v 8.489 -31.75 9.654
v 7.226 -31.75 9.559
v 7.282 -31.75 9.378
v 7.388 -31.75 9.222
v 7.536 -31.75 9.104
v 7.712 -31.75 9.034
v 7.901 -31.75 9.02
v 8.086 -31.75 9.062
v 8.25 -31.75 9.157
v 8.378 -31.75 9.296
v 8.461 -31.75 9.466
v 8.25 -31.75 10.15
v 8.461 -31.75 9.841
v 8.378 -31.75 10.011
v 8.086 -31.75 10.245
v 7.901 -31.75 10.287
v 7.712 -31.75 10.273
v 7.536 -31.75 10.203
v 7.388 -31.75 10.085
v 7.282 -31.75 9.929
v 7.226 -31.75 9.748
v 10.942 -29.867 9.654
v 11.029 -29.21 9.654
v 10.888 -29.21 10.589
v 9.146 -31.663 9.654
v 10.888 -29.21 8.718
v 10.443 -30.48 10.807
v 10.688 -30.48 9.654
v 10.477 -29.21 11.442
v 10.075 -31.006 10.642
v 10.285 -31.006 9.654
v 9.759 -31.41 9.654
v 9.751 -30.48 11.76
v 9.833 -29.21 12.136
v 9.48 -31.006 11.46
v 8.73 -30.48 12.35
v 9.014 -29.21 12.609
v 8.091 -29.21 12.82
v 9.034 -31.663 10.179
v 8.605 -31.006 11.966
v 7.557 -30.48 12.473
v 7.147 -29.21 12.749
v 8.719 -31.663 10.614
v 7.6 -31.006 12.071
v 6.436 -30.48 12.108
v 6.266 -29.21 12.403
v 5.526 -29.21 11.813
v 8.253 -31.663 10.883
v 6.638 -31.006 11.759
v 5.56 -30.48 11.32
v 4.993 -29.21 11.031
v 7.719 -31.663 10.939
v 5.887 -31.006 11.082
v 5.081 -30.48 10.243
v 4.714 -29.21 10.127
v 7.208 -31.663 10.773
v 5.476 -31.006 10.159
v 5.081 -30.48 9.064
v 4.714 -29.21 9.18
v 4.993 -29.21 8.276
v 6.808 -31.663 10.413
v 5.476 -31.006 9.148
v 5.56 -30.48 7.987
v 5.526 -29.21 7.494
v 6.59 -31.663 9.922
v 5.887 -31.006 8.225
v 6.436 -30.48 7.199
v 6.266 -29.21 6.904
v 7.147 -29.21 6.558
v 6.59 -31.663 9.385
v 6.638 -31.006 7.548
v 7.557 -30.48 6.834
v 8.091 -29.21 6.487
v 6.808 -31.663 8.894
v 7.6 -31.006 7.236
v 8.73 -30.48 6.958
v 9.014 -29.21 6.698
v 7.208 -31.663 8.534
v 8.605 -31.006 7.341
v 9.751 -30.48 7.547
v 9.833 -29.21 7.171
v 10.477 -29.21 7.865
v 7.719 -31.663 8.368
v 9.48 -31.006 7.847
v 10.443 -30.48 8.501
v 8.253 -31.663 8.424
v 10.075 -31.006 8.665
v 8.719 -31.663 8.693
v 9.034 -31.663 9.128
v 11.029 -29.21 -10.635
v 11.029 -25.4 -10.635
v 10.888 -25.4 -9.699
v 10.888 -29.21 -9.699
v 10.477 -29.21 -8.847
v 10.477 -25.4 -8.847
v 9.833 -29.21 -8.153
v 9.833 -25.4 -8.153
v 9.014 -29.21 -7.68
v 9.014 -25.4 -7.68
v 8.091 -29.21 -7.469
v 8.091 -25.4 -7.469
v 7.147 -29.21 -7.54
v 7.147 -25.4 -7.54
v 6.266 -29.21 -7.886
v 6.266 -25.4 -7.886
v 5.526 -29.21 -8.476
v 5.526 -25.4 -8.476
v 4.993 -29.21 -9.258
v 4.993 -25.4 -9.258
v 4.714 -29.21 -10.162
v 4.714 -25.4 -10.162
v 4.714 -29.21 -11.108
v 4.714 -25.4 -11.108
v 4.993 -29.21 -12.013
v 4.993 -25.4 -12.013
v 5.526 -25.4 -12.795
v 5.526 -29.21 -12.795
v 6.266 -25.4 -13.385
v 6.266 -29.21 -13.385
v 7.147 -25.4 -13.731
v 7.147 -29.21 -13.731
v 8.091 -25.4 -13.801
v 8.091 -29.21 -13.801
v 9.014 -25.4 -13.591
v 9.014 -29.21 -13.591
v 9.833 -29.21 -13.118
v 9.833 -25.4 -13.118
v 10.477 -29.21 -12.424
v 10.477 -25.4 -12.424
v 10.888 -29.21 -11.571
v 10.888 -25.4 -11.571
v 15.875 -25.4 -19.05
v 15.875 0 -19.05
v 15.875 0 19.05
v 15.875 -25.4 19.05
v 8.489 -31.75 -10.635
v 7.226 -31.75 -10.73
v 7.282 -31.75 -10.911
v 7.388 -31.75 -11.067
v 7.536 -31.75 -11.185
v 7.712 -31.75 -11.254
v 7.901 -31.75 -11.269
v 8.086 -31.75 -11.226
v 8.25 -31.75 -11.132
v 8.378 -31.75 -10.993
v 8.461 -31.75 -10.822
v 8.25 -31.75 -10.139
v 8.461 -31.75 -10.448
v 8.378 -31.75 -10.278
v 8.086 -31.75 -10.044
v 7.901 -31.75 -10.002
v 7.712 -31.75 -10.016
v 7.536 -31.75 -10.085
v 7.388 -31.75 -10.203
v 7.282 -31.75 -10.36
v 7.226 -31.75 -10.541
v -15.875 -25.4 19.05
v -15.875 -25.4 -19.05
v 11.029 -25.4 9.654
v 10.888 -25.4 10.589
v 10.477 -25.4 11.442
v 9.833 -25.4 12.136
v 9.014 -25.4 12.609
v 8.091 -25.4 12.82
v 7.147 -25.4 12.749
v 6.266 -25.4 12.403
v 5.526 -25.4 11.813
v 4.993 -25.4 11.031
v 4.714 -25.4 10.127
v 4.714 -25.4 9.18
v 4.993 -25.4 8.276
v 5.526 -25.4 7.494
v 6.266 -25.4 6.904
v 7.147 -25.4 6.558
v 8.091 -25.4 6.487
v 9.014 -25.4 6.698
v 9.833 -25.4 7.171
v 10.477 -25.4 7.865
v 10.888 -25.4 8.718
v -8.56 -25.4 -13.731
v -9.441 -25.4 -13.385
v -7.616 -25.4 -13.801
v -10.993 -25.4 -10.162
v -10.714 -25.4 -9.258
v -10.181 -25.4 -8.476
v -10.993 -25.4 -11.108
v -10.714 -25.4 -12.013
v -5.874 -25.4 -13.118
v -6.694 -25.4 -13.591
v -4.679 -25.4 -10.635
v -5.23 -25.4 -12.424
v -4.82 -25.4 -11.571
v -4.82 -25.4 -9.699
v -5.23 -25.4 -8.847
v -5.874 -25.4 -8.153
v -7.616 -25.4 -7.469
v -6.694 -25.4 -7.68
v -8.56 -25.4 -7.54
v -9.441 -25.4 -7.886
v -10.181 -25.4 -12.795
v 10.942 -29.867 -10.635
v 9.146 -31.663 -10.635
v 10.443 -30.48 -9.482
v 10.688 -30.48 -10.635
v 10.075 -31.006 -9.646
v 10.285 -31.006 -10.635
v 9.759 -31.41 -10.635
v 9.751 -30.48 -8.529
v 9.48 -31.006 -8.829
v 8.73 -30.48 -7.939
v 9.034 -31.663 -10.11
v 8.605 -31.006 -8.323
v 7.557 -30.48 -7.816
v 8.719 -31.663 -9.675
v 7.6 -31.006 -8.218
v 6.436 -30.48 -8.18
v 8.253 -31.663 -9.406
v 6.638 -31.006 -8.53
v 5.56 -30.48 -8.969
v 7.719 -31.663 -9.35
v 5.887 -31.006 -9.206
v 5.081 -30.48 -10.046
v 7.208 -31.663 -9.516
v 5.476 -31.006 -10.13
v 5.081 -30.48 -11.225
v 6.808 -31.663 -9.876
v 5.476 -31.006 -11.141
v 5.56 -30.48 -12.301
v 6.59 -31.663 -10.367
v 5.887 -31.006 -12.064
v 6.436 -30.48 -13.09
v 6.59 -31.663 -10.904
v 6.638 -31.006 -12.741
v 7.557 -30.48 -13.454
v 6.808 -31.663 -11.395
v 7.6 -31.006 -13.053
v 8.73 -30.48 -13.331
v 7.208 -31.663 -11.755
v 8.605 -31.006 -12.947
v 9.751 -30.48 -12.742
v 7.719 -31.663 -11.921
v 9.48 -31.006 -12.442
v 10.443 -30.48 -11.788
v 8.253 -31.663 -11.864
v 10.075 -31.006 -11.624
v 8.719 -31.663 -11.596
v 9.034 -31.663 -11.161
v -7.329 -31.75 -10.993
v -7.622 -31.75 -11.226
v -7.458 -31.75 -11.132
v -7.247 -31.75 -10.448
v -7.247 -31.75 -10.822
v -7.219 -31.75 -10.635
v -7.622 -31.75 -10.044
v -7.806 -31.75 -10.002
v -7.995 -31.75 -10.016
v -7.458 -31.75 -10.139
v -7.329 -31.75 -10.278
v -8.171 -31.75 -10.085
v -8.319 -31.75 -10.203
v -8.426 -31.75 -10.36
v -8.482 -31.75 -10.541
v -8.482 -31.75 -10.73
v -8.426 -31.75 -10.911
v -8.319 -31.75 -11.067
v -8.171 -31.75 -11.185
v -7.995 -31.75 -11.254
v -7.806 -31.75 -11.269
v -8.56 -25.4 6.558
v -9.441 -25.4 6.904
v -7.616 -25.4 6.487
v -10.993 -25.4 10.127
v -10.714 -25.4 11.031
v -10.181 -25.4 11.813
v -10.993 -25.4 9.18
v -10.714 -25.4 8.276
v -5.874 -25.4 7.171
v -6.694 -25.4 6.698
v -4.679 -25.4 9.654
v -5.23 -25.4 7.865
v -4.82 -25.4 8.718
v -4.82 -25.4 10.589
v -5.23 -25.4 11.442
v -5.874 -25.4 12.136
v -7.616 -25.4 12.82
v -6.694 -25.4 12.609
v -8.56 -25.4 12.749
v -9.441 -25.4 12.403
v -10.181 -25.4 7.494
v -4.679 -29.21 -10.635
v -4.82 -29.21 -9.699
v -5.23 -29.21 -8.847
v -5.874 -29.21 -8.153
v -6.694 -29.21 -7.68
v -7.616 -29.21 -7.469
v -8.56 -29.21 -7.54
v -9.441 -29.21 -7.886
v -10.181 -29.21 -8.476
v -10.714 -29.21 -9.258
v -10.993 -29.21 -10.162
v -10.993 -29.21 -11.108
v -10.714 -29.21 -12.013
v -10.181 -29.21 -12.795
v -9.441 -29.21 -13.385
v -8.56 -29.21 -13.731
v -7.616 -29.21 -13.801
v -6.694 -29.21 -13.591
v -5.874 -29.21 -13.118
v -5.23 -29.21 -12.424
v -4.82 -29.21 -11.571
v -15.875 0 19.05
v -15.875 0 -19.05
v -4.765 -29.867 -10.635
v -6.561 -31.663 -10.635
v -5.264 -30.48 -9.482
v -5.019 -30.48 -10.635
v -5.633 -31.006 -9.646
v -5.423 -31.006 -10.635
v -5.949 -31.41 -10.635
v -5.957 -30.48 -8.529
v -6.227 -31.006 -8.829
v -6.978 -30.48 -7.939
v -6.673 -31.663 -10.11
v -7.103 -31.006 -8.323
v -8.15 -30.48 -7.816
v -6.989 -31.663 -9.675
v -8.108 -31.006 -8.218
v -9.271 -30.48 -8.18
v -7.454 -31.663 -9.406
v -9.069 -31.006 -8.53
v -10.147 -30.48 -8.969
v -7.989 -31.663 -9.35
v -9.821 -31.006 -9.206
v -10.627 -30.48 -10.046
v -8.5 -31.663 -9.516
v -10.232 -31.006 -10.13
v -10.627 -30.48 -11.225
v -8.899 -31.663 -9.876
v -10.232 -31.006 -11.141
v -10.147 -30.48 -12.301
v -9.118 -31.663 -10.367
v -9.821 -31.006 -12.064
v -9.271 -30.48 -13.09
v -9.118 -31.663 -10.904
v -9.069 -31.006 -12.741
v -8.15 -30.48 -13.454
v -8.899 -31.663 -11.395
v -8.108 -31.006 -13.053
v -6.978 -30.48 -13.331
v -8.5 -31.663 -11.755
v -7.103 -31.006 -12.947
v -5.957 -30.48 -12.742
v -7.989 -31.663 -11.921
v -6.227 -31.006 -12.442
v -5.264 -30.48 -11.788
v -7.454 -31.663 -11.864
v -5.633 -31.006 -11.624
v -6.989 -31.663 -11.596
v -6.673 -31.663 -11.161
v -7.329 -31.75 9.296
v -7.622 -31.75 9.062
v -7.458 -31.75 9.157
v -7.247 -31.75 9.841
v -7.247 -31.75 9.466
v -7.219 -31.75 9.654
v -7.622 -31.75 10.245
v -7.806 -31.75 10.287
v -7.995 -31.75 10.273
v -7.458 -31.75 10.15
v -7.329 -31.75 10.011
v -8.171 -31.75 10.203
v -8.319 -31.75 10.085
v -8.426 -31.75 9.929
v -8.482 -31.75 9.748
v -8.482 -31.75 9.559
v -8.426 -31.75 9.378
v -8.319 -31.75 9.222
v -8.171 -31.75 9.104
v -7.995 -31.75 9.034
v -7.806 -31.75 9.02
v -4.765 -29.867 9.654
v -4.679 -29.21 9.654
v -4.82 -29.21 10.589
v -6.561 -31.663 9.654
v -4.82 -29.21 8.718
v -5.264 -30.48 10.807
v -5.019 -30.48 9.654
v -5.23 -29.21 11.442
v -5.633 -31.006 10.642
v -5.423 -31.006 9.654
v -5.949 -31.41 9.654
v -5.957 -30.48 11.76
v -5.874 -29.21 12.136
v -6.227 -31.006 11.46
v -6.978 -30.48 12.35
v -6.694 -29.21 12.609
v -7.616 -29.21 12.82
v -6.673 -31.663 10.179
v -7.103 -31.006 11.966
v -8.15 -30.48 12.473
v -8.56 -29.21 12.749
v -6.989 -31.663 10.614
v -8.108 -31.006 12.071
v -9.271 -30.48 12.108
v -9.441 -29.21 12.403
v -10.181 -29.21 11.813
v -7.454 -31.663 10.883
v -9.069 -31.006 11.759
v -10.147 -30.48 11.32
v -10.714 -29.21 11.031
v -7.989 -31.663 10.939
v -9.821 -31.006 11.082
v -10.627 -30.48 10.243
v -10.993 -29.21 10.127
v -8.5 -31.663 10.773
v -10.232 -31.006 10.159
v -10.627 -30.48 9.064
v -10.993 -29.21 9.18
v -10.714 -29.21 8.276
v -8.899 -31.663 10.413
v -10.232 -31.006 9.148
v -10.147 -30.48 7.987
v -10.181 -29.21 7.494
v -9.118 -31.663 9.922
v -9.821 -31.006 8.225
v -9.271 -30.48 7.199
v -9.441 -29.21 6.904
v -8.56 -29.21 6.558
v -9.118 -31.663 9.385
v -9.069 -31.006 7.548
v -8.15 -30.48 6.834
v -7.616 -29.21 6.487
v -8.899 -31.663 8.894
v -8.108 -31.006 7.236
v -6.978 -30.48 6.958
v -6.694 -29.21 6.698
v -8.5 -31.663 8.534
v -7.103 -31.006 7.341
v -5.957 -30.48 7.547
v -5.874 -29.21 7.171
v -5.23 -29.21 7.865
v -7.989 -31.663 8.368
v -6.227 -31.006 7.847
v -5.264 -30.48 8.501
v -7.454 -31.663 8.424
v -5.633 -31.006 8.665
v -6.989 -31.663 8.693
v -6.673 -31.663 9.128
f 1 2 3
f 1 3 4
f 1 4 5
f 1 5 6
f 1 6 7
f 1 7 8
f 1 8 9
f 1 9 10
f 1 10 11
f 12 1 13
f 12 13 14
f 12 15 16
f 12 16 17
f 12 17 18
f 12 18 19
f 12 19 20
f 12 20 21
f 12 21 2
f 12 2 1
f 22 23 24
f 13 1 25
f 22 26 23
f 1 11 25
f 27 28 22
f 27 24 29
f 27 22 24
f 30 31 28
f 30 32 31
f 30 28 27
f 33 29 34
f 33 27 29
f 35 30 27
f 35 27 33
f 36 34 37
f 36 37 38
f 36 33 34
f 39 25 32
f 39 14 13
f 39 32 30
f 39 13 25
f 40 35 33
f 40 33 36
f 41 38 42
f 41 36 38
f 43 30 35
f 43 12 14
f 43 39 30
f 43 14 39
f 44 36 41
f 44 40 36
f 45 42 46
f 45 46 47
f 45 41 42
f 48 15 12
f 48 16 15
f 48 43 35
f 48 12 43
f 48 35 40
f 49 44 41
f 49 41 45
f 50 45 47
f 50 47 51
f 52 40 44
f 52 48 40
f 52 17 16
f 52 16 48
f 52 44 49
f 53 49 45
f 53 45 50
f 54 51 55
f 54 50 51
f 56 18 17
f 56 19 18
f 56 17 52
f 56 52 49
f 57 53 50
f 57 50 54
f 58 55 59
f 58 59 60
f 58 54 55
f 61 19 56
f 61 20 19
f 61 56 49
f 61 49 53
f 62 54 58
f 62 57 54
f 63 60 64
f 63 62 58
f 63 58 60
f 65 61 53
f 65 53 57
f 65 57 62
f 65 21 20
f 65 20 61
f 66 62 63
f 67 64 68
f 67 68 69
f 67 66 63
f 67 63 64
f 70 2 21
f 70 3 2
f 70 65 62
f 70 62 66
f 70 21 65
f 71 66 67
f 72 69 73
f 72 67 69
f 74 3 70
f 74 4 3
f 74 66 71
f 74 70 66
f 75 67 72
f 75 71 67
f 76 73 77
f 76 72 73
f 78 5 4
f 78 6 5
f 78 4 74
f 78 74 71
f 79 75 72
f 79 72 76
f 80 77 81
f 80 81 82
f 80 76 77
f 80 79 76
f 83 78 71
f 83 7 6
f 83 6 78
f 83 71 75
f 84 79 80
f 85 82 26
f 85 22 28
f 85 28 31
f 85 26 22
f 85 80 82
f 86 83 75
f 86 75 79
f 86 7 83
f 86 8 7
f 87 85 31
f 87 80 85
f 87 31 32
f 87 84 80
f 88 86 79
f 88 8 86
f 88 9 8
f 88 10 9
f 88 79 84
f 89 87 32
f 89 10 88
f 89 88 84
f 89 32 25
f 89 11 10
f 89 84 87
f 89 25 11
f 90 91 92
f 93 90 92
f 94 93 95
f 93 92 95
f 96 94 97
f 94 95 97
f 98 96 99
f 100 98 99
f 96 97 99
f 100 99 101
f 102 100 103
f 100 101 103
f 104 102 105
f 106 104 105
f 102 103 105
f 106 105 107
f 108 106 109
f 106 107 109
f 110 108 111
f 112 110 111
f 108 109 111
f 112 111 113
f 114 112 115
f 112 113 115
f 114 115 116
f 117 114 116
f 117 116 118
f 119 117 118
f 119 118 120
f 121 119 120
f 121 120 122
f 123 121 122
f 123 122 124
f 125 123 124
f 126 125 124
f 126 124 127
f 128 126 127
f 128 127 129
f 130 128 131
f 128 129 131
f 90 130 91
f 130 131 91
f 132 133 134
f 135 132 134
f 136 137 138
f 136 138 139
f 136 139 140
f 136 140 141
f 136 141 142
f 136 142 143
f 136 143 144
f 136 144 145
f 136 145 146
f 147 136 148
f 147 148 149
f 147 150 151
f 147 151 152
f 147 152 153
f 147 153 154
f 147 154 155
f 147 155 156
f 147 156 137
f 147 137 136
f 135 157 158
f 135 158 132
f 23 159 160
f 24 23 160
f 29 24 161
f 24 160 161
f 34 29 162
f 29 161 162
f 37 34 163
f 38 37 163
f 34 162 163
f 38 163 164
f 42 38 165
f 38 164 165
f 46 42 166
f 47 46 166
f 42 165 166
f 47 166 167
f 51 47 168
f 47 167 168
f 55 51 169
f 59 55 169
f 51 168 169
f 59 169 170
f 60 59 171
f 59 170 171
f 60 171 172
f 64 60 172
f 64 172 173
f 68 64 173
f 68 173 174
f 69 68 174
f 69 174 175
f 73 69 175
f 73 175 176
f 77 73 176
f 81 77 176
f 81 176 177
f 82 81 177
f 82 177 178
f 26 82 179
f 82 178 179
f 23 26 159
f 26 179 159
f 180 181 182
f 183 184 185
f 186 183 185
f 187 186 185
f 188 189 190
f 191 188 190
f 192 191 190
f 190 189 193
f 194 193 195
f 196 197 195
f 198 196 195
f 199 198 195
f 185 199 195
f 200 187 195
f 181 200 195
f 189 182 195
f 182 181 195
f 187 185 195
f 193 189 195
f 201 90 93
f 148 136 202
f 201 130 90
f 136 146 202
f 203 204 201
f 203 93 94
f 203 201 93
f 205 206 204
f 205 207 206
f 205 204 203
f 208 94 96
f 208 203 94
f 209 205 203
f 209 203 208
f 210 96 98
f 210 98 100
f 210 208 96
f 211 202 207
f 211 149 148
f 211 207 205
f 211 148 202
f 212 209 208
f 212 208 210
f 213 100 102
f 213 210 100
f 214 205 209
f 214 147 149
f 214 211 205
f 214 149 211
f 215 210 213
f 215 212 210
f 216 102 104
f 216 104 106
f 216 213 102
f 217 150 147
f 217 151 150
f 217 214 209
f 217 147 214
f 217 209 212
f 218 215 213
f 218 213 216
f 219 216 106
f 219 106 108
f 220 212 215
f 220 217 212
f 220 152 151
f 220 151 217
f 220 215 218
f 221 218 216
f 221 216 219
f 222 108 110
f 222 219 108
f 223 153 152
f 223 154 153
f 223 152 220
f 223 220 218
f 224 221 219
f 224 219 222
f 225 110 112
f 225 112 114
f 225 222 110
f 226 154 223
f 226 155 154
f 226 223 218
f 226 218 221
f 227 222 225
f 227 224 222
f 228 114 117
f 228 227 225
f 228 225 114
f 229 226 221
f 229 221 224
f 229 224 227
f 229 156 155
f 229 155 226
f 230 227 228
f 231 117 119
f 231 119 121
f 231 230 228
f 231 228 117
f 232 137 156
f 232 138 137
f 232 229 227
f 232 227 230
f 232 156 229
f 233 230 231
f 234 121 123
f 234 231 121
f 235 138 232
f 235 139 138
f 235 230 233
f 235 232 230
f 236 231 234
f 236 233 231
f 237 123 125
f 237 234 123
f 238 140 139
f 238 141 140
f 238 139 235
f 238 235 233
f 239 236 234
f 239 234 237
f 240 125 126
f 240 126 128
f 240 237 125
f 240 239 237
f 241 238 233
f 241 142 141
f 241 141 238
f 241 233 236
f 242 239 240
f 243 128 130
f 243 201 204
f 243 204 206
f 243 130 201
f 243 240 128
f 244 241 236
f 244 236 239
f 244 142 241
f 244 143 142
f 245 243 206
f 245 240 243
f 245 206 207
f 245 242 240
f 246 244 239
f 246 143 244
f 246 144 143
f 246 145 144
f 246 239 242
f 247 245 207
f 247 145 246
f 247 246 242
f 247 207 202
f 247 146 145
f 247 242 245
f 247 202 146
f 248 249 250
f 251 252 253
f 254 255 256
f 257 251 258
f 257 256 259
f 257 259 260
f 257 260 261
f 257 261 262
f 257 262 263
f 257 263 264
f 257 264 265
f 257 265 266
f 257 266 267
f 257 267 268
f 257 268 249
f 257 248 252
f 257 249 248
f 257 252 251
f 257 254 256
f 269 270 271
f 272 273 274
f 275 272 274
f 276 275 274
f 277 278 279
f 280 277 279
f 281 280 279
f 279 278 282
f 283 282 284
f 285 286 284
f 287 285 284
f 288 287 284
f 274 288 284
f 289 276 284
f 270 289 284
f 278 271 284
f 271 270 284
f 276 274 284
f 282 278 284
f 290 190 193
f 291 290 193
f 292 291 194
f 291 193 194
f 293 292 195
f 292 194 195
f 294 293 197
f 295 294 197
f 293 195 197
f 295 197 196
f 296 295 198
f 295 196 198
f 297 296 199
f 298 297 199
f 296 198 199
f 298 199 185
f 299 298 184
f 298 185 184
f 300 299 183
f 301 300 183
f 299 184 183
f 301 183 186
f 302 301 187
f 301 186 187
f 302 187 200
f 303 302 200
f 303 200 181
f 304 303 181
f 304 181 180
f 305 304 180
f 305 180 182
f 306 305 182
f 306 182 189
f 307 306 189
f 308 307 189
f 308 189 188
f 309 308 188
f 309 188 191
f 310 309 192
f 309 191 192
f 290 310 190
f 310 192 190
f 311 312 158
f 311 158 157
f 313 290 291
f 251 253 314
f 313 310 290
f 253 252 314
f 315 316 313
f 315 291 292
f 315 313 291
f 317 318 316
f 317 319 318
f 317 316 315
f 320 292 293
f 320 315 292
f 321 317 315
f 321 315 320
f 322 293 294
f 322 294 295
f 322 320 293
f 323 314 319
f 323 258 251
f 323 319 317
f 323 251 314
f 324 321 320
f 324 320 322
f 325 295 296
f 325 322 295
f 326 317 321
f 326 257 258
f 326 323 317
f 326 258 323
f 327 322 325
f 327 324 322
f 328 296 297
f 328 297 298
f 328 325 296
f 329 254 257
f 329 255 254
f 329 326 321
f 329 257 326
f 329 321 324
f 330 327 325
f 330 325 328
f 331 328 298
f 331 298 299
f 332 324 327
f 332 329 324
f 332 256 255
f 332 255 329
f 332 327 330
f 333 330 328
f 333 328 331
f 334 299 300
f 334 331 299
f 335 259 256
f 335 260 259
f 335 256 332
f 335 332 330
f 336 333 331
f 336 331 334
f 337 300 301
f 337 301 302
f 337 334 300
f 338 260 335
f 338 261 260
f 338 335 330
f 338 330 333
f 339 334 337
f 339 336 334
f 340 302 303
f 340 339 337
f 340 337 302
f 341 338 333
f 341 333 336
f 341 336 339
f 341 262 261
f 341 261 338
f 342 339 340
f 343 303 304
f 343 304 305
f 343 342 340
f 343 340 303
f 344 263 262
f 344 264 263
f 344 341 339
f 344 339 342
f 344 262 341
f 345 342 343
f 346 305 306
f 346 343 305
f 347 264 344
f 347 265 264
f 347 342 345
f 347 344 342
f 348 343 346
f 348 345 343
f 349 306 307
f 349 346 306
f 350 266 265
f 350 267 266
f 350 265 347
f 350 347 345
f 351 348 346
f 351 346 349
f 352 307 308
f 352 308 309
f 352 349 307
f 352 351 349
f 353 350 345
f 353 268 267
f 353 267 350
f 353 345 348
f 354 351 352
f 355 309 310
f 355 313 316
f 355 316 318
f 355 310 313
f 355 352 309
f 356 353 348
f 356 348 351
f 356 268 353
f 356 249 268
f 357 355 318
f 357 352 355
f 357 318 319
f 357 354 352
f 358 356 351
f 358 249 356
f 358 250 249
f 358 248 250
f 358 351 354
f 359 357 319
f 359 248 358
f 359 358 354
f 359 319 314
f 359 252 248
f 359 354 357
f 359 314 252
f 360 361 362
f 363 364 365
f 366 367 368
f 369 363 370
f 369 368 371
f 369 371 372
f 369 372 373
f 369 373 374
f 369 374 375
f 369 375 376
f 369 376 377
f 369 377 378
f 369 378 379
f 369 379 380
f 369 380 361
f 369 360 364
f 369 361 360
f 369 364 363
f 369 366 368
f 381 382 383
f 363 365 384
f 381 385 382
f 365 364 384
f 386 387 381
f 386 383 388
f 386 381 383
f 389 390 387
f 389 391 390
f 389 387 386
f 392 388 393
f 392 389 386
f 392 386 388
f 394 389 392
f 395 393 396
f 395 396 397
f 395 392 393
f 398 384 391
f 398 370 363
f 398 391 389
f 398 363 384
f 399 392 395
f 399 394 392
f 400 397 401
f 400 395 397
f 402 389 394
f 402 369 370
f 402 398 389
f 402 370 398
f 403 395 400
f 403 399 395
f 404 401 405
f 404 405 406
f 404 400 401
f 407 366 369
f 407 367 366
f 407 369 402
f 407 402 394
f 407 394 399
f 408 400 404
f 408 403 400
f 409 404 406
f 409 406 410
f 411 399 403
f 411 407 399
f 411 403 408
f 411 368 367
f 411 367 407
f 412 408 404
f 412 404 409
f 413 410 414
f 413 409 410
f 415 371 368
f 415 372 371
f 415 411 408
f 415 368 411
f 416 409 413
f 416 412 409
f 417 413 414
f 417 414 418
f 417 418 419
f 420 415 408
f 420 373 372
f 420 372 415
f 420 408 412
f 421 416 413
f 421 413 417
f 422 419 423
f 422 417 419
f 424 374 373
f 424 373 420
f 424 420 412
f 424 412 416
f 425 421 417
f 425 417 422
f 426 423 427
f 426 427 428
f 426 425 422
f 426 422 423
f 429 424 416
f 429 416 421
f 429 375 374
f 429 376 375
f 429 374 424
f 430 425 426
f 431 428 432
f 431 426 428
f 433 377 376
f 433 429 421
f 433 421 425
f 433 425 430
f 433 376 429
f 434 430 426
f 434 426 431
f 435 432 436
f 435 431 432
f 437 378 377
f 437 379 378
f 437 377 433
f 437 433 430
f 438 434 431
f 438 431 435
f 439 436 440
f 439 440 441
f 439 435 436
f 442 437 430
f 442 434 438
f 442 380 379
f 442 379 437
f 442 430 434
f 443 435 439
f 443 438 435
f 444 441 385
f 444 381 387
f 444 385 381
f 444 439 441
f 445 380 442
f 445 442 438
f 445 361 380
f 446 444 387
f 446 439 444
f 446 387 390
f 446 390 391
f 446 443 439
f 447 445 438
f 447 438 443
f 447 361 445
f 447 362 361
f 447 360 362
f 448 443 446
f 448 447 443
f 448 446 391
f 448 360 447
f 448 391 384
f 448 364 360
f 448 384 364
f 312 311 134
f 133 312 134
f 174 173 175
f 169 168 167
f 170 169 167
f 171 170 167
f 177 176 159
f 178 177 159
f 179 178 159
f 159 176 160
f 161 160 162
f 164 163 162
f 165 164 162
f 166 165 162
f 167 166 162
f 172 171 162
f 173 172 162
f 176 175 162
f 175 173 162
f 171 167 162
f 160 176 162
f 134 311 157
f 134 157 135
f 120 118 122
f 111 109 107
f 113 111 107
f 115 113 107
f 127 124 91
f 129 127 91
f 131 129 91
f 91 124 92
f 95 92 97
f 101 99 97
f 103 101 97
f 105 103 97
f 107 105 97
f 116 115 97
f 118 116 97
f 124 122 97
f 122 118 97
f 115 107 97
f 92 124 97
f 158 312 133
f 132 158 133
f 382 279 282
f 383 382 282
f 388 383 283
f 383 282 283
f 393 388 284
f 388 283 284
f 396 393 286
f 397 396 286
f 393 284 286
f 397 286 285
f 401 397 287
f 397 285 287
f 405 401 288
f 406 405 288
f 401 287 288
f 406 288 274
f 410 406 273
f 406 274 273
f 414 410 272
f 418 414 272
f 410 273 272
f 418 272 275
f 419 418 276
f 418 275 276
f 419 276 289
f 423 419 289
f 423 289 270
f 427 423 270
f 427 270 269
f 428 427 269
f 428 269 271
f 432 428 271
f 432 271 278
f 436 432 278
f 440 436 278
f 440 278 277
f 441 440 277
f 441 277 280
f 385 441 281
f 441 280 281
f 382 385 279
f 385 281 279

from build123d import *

# Parameters (mm, degrees)
F0_W     = 31.75
F0_H     = 38.1
F1_DEPTH = 25.4
F2_R     = 3.175
F3_DEPTH = 6.35
F4_R     = 2.54


with BuildPart() as f1:
    # F0 (on Front) → F1 (new body)
    with BuildSketch(Plane.XZ):
        Rectangle(F0_W, F0_H)
    extrude(amount=F1_DEPTH)


with BuildPart() as f3:
    # F2 (on face) → F3 (new body)
    with BuildSketch(Plane.XZ.offset(25.4)):
        with Locations((-7.853743, 9.653558)):
            Circle(F2_R)
        with Locations((7.853741, 9.653558)):
            Circle(F2_R)
        with Locations((-7.853743, -10.635276)):
            Circle(F2_R)
        with Locations((7.853741, -10.635276)):
            Circle(F2_R)
    extrude(amount=F3_DEPTH)

    # F4
    f4_edges = [f3.edges().sort_by_distance(p)[0] for p in [
        (-11.028743, -31.75, 9.653558),
        (4.678741, -31.75, 9.653558),
        (4.678741, -31.75, -10.635276),
        (-11.028743, -31.75, -10.635276),
    ]]
    fillet(f4_edges, radius=F4_R)


solid = Compound([f1.part, f3.part])
